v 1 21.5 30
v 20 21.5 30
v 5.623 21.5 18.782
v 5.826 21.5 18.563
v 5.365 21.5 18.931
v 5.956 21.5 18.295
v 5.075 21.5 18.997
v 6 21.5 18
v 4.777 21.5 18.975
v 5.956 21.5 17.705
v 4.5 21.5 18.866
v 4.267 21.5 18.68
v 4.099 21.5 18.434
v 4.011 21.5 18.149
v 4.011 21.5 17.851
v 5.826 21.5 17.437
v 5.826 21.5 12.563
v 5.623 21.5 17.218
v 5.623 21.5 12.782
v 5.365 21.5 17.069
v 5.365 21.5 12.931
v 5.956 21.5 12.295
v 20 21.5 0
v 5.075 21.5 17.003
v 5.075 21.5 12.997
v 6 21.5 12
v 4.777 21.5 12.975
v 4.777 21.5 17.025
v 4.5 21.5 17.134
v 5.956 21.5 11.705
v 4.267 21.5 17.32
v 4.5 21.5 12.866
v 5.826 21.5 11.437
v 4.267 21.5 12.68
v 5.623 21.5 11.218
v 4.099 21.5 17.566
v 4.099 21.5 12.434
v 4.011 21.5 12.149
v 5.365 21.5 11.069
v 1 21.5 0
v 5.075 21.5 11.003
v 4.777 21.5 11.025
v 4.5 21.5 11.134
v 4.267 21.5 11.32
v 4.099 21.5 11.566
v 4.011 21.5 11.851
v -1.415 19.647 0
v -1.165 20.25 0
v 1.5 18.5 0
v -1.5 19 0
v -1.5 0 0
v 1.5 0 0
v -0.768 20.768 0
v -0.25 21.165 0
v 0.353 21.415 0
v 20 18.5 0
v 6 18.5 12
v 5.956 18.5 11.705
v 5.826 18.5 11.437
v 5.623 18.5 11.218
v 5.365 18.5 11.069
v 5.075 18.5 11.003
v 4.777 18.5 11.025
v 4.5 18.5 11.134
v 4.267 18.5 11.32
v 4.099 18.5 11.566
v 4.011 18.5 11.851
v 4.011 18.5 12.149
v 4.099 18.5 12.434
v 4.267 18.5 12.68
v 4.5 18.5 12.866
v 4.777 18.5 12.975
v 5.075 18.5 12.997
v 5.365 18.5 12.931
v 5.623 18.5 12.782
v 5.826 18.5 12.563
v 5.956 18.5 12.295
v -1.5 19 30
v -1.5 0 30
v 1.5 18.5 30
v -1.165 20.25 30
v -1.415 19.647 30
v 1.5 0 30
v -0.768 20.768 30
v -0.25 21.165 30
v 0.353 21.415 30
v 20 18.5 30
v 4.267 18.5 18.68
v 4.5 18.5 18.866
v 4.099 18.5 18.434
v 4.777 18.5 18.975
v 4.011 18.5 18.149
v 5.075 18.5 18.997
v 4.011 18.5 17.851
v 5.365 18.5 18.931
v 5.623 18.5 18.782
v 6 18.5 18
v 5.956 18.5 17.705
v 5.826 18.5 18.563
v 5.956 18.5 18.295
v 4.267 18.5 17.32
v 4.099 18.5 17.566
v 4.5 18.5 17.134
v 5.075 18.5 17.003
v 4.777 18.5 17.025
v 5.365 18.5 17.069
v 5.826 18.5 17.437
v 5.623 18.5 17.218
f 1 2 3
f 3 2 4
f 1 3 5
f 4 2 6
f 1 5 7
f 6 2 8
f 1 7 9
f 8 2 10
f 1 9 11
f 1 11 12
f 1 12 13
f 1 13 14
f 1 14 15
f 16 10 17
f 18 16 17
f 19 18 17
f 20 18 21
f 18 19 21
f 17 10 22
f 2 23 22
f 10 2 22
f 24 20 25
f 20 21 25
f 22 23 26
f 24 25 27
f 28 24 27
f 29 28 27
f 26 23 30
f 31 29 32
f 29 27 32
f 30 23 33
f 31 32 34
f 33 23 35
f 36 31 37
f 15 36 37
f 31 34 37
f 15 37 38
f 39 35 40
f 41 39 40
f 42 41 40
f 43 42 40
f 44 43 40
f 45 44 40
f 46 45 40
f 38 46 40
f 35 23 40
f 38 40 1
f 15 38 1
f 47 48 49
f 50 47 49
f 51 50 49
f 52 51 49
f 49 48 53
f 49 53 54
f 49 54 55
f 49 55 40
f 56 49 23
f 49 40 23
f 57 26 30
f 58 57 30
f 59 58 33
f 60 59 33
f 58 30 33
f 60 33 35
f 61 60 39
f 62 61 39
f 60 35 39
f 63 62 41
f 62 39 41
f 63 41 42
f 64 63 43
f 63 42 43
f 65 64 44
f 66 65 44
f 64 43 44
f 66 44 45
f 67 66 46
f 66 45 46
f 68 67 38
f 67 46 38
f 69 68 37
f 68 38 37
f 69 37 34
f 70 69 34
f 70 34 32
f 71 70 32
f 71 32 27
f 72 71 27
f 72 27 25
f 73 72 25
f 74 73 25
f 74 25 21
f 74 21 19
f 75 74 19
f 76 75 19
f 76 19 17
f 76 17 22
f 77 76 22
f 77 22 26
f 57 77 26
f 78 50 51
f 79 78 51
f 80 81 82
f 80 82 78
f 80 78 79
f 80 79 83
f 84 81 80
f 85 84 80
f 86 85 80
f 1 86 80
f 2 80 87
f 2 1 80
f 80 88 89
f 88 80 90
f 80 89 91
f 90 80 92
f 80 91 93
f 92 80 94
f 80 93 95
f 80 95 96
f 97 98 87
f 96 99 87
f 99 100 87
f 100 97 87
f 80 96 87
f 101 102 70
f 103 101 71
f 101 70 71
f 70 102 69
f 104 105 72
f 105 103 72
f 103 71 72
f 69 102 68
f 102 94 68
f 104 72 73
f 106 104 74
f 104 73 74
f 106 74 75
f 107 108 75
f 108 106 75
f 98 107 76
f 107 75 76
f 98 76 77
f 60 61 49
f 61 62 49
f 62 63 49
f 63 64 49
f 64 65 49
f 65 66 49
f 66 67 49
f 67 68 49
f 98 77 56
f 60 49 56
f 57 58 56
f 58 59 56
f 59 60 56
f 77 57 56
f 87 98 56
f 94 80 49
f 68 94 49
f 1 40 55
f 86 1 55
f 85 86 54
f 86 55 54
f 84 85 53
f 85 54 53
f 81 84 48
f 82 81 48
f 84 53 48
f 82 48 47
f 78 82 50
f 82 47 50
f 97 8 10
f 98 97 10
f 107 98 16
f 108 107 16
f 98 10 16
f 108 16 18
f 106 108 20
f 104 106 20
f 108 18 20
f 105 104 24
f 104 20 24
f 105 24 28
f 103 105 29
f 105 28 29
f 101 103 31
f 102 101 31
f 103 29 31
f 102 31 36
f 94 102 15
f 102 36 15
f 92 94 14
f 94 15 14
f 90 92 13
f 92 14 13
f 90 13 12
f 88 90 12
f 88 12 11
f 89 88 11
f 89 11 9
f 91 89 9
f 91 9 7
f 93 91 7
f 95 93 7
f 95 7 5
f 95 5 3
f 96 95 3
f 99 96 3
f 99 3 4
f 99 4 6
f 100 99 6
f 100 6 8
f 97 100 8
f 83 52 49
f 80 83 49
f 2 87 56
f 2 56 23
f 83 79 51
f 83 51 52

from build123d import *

# Parameters (mm, degrees)
BOSS_EXTRUDE1_DEPTH             = 30
F_2_0MM_CLEARANCE_DOWEL_HOLE1_D = 2


with BuildPart() as part:
    # Sketch1 → Boss-Extrude1 (new body)
    with BuildSketch(Plane.XY):
        with BuildLine():
            Line((0, 19), (0, 0))
            Line((0, 0), (1.5, 0))
            Line((1.5, 0), (1.5, 18.5))
            Line((1.5, 18.5), (20, 18.5))
            Line((20, 18.5), (20, 20))
            Line((20, 20), (1, 20))
            ThreePointArc((1, 20), (0.292893219, 19.707106781), (0, 19))
        make_face()
        with BuildLine():
            Line((-1.5, 0), (0, 0))
            Line((0, 0), (0, 19))
            ThreePointArc((0, 19), (0.292893219, 19.707106781), (1, 20))
            Line((1, 20), (20, 20))
            Line((20, 20), (20, 21.5))
            Line((20, 21.5), (1, 21.5))
            ThreePointArc((1, 21.5), (-0.767766953, 20.767766953), (-1.5, 19))
            Line((-1.5, 19), (-1.5, 0))
        make_face()
    extrude(amount=BOSS_EXTRUDE1_DEPTH)

    # Ø2.0mm Clearance Dowel Hole1 (through all)
    with Locations(Plane(origin=(-21.929397557, 18.5, -58.5), x_dir=(-1, 0, 0), z_dir=(0, -1, 0))):
        with Locations((-26.929397557, -76.5), (-26.929397557, -70.5)):
            Hole(F_2_0MM_CLEARANCE_DOWEL_HOLE1_D / 2)


solid = part.part
